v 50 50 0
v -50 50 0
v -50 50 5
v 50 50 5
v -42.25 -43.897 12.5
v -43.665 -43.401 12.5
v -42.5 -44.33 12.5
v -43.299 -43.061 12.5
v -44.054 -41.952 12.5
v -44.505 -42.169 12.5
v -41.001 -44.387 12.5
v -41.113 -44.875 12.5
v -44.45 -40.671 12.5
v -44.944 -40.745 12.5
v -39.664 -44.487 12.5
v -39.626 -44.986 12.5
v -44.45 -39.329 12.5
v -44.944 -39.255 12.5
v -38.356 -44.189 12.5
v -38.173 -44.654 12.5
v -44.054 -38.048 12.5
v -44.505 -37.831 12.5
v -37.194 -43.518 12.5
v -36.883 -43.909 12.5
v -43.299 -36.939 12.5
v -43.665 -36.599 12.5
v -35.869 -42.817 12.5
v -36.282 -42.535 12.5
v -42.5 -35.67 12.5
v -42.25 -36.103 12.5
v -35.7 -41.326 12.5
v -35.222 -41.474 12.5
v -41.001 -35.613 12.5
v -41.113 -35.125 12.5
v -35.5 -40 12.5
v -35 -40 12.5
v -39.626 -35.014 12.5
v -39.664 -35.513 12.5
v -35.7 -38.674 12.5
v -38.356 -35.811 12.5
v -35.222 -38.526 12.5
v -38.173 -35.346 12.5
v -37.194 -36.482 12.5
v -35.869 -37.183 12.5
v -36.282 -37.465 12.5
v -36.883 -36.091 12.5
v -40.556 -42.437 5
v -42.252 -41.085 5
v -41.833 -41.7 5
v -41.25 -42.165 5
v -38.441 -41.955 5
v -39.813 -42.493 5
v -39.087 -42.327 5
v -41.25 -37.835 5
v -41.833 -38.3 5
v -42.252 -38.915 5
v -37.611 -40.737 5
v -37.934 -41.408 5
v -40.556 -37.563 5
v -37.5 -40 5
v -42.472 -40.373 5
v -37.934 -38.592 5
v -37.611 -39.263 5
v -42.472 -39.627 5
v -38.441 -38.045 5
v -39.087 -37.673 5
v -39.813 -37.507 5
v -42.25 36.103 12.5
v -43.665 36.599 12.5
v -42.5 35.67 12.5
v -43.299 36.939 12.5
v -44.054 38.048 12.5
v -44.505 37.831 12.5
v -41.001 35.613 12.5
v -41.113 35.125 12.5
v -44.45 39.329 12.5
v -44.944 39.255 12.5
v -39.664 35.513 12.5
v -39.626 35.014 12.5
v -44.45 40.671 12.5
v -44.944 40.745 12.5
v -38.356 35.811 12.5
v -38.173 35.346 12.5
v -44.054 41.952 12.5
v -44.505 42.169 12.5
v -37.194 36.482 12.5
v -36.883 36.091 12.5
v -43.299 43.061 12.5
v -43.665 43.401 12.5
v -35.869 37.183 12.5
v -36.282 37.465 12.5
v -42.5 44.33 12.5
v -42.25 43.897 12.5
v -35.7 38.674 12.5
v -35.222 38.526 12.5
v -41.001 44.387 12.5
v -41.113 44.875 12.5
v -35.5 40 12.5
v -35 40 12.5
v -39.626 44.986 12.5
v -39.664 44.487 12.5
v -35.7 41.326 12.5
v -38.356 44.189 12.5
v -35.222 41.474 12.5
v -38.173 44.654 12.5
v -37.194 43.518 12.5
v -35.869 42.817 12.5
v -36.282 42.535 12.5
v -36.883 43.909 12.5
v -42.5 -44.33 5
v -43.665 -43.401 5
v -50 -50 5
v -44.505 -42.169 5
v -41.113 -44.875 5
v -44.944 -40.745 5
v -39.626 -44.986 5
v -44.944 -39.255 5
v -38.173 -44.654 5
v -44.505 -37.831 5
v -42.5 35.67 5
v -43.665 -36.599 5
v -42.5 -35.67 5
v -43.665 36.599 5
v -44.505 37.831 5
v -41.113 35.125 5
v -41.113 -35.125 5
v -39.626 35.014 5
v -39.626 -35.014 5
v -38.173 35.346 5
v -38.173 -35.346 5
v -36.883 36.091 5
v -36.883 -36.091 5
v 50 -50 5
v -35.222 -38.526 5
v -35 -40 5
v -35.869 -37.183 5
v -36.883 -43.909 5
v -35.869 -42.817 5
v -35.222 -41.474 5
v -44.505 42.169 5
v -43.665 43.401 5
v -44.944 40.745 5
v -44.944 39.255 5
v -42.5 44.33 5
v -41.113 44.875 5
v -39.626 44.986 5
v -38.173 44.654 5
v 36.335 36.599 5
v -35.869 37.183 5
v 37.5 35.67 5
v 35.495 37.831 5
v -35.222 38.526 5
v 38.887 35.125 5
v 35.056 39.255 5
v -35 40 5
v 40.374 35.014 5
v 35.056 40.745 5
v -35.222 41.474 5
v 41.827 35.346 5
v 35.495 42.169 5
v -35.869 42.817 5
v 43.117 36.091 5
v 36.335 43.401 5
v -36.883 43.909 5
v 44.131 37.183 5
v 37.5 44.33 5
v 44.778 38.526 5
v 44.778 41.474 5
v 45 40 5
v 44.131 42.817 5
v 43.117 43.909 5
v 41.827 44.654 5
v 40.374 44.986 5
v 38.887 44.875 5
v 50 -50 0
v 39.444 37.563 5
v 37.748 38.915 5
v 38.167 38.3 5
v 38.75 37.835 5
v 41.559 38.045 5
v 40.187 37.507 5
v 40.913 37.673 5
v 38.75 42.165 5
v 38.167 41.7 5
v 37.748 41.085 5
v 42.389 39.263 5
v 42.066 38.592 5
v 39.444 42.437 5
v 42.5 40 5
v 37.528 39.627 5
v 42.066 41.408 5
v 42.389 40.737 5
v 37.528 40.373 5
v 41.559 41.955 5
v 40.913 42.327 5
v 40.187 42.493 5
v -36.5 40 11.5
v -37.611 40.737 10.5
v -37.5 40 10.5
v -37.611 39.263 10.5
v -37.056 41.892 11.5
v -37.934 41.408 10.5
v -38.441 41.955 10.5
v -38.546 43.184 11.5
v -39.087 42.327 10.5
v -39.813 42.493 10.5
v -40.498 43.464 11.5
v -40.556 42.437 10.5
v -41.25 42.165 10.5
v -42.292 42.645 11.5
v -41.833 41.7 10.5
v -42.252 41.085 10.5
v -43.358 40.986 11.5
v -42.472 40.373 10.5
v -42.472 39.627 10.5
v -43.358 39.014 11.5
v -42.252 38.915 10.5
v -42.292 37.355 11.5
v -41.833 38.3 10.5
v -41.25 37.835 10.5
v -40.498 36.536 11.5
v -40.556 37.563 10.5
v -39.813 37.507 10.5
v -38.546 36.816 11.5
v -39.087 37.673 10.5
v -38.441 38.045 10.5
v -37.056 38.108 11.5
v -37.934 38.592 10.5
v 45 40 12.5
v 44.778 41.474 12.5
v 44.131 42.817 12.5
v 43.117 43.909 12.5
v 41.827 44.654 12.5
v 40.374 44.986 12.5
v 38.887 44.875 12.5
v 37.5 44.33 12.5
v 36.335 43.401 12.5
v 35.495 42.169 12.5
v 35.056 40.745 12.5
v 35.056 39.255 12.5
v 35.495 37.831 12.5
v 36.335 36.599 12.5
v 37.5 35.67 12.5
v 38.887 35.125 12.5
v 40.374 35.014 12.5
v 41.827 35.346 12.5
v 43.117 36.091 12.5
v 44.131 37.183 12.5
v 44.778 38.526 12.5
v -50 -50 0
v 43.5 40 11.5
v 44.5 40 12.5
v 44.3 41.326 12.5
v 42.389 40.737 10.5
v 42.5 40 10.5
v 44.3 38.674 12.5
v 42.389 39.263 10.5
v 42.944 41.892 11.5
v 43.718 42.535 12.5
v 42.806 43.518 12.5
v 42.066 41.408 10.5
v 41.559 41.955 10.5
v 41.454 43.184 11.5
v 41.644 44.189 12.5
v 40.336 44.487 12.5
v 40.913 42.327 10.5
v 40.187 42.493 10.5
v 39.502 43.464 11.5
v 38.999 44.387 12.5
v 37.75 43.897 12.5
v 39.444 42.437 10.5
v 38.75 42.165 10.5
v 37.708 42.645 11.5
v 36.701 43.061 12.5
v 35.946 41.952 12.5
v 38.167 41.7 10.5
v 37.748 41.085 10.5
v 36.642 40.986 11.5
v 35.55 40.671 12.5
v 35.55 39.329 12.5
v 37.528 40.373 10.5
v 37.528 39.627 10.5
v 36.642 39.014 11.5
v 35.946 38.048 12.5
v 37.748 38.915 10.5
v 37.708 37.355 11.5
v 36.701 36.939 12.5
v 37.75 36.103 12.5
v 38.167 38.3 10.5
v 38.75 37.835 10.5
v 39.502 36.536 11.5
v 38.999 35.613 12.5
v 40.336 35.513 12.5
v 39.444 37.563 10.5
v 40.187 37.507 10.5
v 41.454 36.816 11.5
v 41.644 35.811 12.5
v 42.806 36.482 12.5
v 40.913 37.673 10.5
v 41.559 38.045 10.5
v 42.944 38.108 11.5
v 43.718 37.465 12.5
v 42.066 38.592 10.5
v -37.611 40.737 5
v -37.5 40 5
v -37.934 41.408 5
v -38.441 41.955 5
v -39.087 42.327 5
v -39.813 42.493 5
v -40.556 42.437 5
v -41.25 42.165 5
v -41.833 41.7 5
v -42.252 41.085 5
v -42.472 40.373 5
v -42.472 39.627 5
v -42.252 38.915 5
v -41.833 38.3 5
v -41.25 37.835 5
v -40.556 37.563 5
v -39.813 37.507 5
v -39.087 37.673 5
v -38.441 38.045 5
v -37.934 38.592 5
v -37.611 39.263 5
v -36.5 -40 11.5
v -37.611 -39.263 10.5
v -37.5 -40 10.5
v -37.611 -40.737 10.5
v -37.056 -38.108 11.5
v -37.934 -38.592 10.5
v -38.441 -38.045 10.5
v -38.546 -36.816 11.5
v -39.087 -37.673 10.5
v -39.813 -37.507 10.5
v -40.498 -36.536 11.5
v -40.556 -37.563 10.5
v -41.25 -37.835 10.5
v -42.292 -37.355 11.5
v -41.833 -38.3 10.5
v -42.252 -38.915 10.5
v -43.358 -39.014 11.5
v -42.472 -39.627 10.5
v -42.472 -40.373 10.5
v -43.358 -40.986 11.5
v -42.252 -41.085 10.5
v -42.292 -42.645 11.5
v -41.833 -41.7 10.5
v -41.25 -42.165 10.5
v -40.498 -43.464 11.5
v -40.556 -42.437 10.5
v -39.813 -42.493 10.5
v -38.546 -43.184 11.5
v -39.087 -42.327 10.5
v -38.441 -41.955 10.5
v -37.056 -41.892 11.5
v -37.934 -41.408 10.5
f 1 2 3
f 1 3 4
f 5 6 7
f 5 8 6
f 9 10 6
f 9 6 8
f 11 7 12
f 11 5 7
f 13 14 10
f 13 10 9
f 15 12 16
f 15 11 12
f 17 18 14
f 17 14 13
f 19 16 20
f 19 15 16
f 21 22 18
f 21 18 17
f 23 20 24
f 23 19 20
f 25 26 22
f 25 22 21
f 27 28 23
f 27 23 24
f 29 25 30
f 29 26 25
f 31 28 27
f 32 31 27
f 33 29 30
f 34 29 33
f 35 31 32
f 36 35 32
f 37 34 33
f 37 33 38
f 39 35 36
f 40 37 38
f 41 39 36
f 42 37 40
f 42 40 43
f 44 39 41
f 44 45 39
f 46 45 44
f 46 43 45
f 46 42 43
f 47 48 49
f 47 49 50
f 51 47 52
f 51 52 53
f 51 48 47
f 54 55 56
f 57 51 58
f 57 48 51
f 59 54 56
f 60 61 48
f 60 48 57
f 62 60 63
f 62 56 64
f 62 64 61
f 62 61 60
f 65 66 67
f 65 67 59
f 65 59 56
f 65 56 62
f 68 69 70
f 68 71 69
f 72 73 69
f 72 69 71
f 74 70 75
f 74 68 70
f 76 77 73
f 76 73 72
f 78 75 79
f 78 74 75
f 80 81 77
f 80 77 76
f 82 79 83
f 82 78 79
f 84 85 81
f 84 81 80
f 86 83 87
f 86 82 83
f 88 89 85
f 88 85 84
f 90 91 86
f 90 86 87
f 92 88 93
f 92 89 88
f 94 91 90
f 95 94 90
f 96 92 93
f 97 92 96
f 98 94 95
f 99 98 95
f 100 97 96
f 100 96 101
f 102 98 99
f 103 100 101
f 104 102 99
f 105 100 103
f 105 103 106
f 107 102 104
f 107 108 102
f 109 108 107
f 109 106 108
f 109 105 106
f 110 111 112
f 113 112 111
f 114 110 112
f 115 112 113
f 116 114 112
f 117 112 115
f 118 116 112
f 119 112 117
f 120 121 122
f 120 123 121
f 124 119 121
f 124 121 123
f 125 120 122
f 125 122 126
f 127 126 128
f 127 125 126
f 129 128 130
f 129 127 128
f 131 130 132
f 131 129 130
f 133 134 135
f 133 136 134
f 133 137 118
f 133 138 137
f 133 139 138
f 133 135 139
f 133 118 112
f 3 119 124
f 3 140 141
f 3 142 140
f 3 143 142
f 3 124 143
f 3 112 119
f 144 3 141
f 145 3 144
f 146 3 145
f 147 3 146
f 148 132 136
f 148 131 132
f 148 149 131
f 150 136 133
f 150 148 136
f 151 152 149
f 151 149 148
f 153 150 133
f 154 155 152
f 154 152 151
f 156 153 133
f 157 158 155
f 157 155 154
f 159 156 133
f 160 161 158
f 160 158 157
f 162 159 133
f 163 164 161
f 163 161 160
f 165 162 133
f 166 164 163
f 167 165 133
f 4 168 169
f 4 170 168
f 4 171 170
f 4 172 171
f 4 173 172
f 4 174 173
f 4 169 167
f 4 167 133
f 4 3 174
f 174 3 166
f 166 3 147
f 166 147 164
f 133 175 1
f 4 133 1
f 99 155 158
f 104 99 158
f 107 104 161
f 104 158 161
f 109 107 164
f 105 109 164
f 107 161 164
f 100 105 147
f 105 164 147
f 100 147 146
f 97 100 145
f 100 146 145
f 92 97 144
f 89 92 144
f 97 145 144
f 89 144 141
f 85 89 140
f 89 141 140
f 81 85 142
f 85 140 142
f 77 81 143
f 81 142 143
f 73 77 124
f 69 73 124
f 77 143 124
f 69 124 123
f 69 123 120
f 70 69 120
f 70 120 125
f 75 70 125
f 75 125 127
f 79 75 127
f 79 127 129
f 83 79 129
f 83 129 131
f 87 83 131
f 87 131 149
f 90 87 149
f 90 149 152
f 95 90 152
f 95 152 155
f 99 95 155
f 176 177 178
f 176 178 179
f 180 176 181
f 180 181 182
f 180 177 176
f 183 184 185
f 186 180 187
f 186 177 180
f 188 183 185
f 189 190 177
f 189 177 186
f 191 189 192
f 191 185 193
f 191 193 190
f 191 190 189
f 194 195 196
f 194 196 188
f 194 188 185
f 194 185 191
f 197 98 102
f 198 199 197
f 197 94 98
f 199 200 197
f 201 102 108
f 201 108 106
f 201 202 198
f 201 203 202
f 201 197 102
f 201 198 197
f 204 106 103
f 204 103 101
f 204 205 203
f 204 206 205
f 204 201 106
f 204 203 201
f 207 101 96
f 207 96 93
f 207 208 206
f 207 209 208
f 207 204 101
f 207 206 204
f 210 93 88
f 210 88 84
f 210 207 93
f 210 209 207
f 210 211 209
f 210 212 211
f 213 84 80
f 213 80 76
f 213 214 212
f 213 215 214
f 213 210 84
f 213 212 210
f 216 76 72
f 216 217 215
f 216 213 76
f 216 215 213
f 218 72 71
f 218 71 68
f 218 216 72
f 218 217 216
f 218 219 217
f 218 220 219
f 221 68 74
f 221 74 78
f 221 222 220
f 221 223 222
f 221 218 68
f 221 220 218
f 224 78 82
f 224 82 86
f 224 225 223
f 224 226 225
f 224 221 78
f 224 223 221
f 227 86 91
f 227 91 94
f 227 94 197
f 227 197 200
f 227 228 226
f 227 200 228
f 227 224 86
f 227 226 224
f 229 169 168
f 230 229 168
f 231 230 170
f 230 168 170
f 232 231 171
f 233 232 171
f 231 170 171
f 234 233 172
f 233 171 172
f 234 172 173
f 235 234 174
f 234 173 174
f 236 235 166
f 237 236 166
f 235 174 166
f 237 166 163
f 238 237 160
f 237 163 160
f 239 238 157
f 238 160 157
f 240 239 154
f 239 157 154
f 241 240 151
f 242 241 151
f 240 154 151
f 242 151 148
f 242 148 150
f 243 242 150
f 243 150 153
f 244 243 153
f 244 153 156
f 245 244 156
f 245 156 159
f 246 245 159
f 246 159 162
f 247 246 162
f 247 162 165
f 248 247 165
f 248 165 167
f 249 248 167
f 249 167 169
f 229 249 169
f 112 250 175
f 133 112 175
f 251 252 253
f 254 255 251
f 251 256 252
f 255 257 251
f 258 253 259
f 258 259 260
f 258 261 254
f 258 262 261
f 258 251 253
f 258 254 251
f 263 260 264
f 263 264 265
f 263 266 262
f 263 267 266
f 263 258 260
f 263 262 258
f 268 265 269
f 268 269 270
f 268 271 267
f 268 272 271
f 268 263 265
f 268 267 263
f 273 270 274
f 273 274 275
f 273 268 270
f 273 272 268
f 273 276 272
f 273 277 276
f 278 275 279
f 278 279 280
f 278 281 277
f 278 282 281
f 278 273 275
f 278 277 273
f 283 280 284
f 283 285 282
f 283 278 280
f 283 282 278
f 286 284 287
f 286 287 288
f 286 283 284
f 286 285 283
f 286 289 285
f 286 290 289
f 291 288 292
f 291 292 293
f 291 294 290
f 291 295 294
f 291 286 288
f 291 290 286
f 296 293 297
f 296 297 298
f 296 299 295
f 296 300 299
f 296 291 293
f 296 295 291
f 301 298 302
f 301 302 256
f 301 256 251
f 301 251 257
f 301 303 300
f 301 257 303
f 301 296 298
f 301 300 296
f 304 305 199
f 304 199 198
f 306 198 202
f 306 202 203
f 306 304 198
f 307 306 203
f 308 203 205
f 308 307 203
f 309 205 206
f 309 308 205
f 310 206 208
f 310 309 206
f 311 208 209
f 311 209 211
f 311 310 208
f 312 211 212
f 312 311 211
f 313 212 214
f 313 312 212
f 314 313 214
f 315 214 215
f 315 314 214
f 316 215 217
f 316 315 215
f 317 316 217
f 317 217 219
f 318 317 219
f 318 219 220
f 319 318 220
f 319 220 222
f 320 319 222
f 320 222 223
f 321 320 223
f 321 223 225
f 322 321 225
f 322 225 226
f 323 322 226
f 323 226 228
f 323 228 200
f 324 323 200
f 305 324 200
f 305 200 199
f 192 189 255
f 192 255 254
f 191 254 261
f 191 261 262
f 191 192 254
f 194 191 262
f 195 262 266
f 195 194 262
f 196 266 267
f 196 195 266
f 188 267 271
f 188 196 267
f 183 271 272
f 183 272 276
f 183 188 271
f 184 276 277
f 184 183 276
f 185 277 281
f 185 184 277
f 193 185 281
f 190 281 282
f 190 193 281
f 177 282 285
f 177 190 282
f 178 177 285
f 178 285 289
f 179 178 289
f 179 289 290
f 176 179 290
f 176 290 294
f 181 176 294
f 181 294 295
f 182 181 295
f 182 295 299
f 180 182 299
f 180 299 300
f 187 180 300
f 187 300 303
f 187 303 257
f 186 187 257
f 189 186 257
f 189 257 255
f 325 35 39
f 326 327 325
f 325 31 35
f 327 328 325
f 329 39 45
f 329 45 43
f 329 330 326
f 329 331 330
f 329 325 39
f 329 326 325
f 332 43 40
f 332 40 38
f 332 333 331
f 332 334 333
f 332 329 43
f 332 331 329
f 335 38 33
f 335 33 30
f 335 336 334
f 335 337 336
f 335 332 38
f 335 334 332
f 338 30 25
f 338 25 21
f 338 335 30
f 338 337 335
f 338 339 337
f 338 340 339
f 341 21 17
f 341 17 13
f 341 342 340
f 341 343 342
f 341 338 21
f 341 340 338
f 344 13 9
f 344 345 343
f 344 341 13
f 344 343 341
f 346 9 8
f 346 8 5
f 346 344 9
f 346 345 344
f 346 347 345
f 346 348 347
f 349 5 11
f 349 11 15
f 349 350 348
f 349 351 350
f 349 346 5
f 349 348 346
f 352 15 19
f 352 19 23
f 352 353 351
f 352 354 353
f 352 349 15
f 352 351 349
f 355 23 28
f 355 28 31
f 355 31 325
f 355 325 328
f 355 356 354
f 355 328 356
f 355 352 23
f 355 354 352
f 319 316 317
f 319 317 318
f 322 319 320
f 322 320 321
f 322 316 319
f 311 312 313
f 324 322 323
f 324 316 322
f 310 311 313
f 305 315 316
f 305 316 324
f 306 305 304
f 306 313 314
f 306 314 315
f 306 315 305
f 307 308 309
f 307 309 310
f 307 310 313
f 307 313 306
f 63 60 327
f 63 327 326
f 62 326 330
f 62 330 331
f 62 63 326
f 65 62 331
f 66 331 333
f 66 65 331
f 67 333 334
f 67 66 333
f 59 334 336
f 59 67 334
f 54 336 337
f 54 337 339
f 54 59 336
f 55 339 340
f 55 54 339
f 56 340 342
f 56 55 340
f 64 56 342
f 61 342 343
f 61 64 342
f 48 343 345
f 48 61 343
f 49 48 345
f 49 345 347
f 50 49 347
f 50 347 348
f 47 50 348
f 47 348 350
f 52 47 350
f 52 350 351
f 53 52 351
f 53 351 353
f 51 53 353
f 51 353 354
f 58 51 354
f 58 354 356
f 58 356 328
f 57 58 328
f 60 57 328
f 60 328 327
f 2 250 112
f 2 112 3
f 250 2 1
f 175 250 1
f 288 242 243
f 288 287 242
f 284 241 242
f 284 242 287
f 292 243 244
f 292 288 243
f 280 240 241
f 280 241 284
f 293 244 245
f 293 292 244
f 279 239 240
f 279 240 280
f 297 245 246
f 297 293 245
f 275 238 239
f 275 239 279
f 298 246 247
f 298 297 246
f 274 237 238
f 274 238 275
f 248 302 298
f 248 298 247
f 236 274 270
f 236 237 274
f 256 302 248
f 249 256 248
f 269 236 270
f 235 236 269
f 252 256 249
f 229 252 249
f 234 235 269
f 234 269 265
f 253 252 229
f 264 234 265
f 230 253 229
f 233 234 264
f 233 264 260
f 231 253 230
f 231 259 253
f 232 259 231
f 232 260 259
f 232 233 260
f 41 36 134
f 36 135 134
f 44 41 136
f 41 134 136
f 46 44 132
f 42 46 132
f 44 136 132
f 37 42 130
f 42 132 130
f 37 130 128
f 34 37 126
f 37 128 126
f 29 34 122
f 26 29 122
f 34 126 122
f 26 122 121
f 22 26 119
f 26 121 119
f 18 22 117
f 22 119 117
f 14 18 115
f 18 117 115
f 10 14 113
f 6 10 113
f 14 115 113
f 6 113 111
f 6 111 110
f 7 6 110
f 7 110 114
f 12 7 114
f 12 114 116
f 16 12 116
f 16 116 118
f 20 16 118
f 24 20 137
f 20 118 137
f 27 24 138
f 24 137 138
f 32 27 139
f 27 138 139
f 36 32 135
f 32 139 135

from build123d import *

# Parameters (mm, degrees)
F0_W     = 100
F0_H     = 100
F1_DEPTH = 5
F2_R     = 5
F2_R_2   = 2.5
F3_DEPTH = 5
F6_R     = 5
F6_R_2   = 2.5
F7_DEPTH = 2.5
F8_SIZE  = 2


with BuildPart() as f1:
    # F0 (on Top) → F1 (new body)
    with BuildSketch(Plane.XY):
        Rectangle(F0_W, F0_H)
    extrude(amount=F1_DEPTH)

    # F2 (on face) → F3 (join)
    with BuildSketch(Plane.XY.offset(5)):
        with Locations((-40, 40)):
            Circle(F2_R)
        with Locations((-40, 40)):
            Circle(F2_R_2, mode=Mode.SUBTRACT)
        with Locations((-40, -40)):
            Circle(F2_R)
        with Locations((-40, -40)):
            Circle(F2_R_2, mode=Mode.SUBTRACT)
        with Locations((40, 40)):
            Circle(F2_R)
        with Locations((40, 40)):
            Circle(F2_R_2, mode=Mode.SUBTRACT)
    extrude(amount=F3_DEPTH)

    # F6 (on face) → F7 (join)
    with BuildSketch(Plane.XY.offset(10)):
        with Locations((-40, -40)):
            Circle(F6_R)
        with Locations((-40, -40)):
            Circle(F6_R_2, mode=Mode.SUBTRACT)
        with Locations((40, 40)):
            Circle(F6_R)
        with Locations((40, 40)):
            Circle(F6_R_2, mode=Mode.SUBTRACT)
        with Locations((-40, 40)):
            Circle(F6_R)
        with Locations((-40, 40)):
            Circle(F6_R_2, mode=Mode.SUBTRACT)
    extrude(amount=F7_DEPTH)

    # F8
    f8_edges = [f1.edges().sort_by_distance(p)[0] for p in [
        (-42.5, 40, 12.5),
        (-42.5, -40, 12.5),
        (37.5, 40, 12.5),
    ]]
    chamfer(f8_edges, length=F8_SIZE)


solid = f1.part
